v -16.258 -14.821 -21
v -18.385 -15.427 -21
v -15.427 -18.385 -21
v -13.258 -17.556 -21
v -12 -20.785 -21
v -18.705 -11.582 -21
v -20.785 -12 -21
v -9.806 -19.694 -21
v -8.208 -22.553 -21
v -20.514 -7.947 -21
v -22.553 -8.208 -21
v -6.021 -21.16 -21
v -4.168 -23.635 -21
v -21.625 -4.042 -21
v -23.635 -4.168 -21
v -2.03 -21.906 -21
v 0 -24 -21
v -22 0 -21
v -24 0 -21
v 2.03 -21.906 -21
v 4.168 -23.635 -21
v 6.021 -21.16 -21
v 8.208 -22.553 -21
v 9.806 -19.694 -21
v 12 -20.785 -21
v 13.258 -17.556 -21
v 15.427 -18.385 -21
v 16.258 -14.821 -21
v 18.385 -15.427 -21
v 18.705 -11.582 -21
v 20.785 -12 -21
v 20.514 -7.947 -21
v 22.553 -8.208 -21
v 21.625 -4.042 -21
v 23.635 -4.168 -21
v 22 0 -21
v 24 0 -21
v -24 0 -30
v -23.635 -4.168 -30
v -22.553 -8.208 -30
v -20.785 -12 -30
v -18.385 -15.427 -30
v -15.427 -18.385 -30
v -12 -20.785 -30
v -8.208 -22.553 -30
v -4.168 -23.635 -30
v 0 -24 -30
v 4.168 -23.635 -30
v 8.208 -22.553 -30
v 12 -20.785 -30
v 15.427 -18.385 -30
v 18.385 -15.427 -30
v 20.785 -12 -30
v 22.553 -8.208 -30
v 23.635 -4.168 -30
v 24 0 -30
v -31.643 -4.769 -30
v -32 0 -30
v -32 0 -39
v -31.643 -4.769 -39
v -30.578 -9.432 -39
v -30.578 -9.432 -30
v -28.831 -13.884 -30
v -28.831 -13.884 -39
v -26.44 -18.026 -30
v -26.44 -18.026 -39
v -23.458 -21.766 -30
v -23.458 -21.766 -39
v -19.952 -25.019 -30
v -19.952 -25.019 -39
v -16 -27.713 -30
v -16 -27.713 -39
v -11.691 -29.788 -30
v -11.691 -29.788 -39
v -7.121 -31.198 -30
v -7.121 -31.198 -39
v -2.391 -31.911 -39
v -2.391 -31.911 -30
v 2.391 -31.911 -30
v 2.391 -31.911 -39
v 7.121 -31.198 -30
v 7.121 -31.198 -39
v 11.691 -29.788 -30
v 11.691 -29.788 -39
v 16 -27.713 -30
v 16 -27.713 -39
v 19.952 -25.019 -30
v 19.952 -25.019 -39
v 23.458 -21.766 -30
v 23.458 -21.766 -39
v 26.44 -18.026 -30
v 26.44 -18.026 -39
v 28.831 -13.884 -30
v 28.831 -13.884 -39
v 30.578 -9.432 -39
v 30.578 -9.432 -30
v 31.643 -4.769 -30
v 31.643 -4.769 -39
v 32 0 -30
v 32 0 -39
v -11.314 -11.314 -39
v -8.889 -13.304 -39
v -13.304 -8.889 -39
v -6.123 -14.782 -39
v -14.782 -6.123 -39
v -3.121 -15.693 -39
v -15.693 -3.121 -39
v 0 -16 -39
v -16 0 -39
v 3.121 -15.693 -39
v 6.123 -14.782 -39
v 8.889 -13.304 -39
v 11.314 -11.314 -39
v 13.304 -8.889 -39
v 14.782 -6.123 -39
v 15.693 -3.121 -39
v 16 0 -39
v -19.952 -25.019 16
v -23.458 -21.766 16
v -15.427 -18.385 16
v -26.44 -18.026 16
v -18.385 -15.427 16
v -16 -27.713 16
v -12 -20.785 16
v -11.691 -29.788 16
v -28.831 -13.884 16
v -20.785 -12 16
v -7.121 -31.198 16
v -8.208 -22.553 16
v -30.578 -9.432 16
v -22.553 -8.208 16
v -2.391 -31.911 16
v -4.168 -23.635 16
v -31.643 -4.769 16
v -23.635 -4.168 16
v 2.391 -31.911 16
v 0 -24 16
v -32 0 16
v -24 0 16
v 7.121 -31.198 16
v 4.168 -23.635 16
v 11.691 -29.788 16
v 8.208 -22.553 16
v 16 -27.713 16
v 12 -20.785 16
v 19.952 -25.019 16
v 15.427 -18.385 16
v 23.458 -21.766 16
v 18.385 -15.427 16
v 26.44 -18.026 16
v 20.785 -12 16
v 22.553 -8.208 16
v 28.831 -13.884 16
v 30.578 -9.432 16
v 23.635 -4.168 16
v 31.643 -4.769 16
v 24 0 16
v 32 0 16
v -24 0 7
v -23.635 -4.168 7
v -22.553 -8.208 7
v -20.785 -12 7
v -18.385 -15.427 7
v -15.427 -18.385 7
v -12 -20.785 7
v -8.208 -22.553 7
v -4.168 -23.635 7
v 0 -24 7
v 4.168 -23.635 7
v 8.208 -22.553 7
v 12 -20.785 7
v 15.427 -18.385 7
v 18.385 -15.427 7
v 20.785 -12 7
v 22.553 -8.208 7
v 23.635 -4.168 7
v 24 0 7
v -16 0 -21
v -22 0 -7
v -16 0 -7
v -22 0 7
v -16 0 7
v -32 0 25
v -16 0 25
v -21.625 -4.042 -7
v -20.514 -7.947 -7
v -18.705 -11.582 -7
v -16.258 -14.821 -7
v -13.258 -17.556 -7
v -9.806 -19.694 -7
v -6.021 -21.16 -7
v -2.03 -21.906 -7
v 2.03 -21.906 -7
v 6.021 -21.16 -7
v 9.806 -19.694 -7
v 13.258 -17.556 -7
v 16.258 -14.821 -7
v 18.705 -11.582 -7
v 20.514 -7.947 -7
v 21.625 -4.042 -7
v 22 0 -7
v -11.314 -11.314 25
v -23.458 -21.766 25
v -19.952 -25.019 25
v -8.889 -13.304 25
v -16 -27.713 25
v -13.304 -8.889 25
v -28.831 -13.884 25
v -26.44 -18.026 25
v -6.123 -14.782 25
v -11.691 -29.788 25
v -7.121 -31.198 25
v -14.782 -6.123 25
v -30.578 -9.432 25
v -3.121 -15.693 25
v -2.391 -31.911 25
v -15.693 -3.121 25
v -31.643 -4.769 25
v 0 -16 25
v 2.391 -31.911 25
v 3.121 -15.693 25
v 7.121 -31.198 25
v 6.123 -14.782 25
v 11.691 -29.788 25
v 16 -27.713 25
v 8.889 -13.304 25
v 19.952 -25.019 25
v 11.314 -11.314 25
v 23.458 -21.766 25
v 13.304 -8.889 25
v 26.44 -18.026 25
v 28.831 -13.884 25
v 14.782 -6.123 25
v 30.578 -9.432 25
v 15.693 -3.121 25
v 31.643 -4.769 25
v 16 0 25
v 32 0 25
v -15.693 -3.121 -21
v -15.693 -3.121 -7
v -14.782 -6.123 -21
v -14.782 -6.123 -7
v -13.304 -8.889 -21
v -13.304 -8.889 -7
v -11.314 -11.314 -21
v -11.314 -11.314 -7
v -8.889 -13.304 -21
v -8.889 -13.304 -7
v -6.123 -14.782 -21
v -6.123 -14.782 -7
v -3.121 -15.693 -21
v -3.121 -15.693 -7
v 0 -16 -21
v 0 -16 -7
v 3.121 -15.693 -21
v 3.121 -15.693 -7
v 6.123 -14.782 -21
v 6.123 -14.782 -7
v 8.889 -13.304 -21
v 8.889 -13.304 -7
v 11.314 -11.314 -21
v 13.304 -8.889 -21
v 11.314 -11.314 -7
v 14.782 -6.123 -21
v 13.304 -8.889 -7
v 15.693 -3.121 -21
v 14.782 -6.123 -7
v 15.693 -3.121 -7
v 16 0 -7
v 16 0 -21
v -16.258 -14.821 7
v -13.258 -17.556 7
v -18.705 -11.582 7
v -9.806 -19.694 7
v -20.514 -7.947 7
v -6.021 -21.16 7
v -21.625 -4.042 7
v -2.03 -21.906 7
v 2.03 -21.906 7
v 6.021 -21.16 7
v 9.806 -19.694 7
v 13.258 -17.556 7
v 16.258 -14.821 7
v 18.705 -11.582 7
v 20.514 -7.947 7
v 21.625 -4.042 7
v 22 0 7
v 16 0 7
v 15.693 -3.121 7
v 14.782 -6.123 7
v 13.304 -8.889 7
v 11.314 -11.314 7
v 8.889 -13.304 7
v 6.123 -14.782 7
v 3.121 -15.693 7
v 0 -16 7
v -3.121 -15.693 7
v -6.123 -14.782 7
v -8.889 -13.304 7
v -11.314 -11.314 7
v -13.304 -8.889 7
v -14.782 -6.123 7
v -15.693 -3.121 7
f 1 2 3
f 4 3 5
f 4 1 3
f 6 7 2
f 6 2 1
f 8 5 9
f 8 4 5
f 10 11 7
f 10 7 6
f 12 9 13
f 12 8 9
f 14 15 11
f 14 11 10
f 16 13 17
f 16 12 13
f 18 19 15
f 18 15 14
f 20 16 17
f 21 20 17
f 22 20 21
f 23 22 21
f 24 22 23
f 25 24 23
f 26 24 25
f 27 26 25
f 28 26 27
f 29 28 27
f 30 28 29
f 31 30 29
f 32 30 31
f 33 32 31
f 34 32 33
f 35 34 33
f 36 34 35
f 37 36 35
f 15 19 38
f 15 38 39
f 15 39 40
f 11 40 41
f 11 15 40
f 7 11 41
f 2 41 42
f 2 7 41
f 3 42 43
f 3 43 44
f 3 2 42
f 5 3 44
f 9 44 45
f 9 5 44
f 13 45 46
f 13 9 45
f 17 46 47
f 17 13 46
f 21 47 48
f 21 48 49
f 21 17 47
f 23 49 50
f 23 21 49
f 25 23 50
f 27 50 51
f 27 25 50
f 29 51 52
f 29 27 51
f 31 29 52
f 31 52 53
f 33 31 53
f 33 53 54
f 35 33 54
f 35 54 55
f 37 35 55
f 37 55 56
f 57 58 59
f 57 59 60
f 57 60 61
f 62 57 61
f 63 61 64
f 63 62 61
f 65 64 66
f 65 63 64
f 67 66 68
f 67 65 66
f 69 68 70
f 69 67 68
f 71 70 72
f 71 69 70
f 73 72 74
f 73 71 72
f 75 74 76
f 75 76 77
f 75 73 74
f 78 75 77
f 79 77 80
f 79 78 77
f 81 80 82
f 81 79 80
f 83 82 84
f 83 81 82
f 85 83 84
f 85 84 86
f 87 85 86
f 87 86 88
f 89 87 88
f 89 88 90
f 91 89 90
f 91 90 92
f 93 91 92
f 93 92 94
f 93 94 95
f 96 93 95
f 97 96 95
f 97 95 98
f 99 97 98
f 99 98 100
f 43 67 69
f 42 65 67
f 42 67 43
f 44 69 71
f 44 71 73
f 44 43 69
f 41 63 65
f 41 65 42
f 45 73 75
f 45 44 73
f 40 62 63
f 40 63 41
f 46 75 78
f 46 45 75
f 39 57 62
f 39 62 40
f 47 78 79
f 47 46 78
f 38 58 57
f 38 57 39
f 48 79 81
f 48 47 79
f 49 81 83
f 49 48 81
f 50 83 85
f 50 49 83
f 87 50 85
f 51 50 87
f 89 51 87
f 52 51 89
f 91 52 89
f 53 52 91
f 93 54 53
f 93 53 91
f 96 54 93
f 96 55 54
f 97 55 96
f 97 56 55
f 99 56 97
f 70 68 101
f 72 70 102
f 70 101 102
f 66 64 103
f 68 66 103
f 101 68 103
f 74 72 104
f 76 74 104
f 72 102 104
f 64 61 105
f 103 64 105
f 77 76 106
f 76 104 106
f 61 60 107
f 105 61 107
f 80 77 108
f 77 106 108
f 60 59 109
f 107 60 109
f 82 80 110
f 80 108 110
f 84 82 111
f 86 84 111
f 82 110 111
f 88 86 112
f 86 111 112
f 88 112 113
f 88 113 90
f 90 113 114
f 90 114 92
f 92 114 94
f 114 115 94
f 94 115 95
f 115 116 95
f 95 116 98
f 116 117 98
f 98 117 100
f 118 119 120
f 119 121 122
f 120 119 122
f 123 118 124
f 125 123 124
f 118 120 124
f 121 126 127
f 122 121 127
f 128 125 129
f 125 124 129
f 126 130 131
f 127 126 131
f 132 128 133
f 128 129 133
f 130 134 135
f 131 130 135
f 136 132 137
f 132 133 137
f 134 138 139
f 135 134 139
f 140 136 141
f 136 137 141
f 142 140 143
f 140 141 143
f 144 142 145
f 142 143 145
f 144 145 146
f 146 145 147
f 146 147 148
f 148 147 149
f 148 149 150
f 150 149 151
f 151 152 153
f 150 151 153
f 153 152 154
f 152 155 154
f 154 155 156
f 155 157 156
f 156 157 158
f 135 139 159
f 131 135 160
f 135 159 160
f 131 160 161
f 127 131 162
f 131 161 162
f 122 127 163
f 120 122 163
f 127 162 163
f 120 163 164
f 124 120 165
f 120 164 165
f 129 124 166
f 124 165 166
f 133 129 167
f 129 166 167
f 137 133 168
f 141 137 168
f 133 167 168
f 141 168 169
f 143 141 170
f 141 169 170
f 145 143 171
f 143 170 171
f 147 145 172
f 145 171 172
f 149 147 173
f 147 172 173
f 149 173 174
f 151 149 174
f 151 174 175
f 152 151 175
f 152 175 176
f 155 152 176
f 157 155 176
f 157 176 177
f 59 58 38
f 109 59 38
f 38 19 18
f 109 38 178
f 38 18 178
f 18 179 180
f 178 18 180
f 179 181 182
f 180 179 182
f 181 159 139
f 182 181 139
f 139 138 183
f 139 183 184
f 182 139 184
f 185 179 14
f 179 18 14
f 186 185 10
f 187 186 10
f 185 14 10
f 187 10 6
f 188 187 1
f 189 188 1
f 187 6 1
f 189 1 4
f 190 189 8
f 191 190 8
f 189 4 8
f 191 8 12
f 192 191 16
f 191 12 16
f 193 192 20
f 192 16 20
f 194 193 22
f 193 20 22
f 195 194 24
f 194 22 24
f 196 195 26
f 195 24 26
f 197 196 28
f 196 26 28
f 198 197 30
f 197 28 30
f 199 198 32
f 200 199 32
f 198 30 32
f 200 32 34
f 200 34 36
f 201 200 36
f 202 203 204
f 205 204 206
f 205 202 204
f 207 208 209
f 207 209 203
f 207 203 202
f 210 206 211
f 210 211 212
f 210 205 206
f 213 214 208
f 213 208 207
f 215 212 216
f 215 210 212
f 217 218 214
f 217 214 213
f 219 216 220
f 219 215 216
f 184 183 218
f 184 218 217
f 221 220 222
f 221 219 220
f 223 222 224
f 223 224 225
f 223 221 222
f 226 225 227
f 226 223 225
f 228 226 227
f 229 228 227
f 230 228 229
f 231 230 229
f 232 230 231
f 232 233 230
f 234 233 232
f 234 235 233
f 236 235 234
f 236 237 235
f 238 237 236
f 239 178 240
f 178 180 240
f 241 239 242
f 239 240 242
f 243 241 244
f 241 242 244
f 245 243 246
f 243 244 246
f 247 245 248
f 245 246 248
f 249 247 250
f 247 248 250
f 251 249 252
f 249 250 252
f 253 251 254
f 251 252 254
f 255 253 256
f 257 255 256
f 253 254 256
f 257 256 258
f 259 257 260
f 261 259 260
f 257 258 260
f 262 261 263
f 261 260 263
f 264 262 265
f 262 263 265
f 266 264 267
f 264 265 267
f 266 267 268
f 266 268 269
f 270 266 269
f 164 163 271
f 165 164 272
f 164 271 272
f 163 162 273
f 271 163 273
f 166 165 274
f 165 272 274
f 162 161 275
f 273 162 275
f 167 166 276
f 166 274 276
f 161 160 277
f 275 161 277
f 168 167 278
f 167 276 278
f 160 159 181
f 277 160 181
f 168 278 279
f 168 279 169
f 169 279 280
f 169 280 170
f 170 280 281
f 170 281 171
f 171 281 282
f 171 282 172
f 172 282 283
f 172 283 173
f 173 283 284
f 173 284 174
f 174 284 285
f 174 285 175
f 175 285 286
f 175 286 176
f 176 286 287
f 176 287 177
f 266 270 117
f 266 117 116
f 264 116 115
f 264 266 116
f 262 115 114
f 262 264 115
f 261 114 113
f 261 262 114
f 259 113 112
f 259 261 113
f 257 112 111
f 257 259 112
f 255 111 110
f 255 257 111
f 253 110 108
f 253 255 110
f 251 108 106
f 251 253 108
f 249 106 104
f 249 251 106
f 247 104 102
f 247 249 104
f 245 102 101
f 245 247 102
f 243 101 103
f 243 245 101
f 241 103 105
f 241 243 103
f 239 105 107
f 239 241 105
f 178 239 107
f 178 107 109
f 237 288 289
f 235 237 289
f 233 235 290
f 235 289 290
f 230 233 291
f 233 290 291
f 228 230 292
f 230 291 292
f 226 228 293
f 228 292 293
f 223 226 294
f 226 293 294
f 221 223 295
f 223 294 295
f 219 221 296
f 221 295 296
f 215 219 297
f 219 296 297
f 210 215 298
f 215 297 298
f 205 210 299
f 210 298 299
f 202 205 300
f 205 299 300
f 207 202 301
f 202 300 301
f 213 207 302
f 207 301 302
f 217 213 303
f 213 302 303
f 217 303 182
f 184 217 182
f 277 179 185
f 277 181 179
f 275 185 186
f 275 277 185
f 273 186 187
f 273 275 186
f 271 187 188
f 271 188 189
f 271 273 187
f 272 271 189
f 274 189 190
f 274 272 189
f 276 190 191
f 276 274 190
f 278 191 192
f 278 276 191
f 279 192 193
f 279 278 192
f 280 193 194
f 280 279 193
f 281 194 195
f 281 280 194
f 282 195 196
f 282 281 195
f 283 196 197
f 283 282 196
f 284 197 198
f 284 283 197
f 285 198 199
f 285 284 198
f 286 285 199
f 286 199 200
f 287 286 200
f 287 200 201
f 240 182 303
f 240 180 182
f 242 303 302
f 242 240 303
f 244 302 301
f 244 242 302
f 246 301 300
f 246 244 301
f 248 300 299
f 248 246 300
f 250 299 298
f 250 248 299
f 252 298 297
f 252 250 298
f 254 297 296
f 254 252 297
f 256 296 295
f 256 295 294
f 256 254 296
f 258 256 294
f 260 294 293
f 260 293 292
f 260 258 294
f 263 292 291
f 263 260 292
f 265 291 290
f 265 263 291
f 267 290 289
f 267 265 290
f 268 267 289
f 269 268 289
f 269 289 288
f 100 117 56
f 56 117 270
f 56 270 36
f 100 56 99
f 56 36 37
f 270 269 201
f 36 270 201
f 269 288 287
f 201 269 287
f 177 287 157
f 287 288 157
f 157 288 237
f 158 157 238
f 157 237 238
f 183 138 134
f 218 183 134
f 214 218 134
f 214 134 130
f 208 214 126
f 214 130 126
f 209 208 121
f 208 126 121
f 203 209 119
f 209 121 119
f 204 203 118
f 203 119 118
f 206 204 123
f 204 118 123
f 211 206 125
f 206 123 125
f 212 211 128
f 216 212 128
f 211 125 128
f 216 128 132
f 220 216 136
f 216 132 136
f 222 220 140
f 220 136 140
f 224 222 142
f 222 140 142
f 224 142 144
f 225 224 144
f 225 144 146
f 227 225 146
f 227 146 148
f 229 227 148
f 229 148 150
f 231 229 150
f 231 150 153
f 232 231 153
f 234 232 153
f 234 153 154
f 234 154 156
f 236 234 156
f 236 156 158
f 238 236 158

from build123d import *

# Parameters (mm, degrees)
SKETCH1_R           = 22
SKETCH1_R_2         = 16
BOSS_EXTRUDE2_DEPTH = 7
SKETCH3_R           = 24
BOSS_EXTRUDE6_DEPTH = 9
SKETCH6_R           = 32
BOSS_EXTRUDE7_DEPTH = 9
SKETCH7_R           = 16
CUT_EXTRUDE2_DEPTH  = 56.425625842
CUT_EXTRUDE3_DEPTH  = 79.383671769


with BuildPart() as part:
    # Sketch1 → Boss-Extrude2 (new, symmetric)
    with BuildSketch(Plane.XY):
        Circle(SKETCH1_R)
        Circle(SKETCH1_R_2, mode=Mode.SUBTRACT)
    extrude(amount=BOSS_EXTRUDE2_DEPTH, both=True)

    # Sketch3 → Boss-Extrude6 (add)
    with BuildSketch(Plane.XY.offset(7)):
        Circle(SKETCH3_R)
    extrude(amount=BOSS_EXTRUDE6_DEPTH)

    # Sketch6 → Boss-Extrude7 (add)
    with BuildSketch(Plane.XY.offset(16)):
        Circle(SKETCH6_R)
    extrude(amount=BOSS_EXTRUDE7_DEPTH)

    # Sketch7 → Cut-Extrude2 (cut, through all)
    with BuildSketch(Plane(origin=(0, 0, -7), x_dir=(-1, 0, 0), z_dir=(0, 0, -1))):
        Circle(SKETCH7_R)
    extrude(amount=-CUT_EXTRUDE2_DEPTH, mode=Mode.SUBTRACT)

    # Mirror3: part across plane


with BuildPart() as part_1:
    add(part.part)
    add(part.part.mirror(Plane.XY.offset(-7)))

    # Sketch8 → Cut-Extrude3 (cut, through all)
    with BuildSketch(Plane.XY.offset(25)):
        Polygon((-194.543052514, 0), (-35.372068519, 0), (34.570182834, 0), (193.741166829, 0), (193.741166829, 318.34196799), (-194.543052514, 318.34196799), align=None)
    extrude(amount=-CUT_EXTRUDE3_DEPTH, mode=Mode.SUBTRACT)


solid = part_1.part
